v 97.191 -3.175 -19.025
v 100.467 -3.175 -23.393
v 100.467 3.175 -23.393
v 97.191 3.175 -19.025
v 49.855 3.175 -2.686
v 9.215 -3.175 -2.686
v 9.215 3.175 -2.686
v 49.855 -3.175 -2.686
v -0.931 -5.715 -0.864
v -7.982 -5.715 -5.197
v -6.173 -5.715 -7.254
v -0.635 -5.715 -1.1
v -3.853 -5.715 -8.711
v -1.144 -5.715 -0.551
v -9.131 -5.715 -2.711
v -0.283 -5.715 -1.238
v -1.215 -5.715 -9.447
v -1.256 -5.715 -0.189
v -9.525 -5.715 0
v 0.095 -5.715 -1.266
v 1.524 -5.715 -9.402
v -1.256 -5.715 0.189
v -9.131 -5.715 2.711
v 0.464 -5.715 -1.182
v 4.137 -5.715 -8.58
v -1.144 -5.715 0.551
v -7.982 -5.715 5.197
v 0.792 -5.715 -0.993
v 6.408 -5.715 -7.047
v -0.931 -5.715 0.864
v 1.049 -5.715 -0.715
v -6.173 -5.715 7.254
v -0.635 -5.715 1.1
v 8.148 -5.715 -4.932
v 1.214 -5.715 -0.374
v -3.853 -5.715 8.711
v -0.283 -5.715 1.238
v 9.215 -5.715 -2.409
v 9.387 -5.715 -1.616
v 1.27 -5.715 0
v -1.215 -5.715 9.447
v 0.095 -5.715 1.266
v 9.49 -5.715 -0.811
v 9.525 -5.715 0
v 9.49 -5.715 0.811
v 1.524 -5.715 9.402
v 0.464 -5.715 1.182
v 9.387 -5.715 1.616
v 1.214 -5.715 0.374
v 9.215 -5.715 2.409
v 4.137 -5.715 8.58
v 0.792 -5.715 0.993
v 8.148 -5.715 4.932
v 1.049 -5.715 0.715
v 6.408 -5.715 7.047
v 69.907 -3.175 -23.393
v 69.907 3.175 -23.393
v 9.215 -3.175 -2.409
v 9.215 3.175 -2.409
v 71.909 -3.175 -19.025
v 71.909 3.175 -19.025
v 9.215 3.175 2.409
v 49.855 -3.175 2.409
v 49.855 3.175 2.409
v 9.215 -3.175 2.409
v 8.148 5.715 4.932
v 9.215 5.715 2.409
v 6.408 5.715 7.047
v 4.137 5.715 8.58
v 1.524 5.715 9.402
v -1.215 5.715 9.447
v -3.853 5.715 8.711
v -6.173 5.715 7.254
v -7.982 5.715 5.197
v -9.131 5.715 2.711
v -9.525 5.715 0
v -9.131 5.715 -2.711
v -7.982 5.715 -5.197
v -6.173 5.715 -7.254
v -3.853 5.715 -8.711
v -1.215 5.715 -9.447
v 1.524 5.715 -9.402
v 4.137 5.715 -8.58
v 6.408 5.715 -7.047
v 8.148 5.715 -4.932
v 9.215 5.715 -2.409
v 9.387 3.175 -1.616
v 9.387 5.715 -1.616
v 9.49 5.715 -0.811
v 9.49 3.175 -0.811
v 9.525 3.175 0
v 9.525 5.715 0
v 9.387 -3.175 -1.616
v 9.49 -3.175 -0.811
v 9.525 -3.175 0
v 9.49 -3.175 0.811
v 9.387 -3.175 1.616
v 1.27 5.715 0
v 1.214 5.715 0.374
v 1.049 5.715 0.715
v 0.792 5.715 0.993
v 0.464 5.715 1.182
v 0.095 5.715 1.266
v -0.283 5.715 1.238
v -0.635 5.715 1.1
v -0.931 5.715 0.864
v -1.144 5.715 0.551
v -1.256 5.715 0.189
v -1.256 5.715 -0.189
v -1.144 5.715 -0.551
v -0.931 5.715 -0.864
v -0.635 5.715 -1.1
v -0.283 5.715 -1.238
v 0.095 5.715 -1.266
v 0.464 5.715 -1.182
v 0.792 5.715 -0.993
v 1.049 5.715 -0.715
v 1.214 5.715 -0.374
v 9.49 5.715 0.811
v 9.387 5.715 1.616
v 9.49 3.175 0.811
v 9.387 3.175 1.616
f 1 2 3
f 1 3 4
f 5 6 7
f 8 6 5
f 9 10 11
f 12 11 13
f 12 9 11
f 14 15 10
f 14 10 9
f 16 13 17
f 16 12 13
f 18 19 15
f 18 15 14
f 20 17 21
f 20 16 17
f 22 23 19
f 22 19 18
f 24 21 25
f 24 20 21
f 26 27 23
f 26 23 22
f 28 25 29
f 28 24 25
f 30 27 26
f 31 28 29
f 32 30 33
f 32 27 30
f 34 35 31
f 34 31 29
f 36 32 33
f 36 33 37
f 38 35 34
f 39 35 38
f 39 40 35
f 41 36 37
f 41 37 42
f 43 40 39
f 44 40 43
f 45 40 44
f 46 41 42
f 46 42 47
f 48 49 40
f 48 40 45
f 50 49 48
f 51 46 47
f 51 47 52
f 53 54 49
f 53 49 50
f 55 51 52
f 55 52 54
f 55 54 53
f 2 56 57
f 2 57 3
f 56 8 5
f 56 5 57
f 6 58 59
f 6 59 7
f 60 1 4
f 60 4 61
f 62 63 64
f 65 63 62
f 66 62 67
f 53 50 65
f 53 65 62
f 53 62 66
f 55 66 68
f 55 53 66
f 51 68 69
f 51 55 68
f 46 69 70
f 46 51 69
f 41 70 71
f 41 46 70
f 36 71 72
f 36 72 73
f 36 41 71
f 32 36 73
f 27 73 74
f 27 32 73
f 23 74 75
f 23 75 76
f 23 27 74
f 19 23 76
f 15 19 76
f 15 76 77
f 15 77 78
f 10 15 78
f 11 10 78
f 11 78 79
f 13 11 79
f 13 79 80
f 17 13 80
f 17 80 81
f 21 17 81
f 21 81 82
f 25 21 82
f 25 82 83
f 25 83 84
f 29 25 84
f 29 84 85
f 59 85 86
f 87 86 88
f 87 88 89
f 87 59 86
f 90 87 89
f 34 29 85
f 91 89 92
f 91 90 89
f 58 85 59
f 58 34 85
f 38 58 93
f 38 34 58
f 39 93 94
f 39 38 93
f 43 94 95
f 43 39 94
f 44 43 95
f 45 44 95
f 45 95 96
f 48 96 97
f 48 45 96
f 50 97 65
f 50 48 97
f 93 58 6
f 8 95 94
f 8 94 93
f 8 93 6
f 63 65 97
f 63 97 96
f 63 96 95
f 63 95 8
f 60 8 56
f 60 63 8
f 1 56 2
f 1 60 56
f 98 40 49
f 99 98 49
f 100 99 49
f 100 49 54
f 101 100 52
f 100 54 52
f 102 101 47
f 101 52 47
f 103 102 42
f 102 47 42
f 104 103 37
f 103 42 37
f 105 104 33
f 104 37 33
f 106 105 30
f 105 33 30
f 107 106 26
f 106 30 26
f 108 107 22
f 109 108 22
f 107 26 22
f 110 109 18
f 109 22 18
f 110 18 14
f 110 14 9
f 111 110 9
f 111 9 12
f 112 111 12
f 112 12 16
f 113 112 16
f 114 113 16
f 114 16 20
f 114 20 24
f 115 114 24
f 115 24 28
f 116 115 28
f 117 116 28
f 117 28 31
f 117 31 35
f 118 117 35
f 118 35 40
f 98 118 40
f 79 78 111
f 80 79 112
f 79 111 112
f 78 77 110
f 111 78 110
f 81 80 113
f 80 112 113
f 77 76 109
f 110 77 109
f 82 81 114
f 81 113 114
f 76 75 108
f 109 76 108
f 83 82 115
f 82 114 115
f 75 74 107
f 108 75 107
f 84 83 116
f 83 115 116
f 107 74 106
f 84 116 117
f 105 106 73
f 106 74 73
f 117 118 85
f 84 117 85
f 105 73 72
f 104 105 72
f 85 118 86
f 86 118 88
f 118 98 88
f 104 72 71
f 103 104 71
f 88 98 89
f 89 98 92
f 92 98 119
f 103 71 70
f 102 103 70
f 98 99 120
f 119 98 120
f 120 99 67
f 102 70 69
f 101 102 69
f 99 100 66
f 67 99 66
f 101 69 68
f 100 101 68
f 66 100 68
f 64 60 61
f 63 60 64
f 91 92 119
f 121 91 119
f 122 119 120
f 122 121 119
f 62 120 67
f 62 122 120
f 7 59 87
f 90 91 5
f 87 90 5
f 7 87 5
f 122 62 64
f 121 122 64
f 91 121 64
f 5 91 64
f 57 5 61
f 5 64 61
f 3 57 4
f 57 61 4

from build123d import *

# Parameters (mm, degrees)
F1_DEPTH = 5.715
F2_DEPTH = 3.175
F3_R     = 1.27
F4_DEPTH = 25.4


with BuildPart() as f1:
    # F0 (on Front) → F1 (new body, symmetric)
    with BuildSketch(Plane.XZ):
        with BuildLine():
            ThreePointArc((9.215210569, -2.4094644982), (9.4472351953, -1.2146489884), (9.525, 0))
            ThreePointArc((9.525, 0), (9.4472351953, 1.2146489884), (9.215210569, 2.4094644982))
            Line((9.215210569, 2.4094644982), (9.215210569, -2.4094644982))
        make_face()
        with BuildLine():
            Line((9.215210569, -2.4094644982), (9.215210569, 2.4094644982))
            ThreePointArc((9.215210569, 2.4094644982), (-9.525, 0), (9.215210569, -2.4094644982))
        make_face()
    extrude(amount=F1_DEPTH, both=True)

    # F0 (on Front) → F2 (join, symmetric)
    with BuildSketch(Plane.XZ):
        with BuildLine():
            ThreePointArc((9.215210569, 2.4094644982), (9.4472351953, 1.2146489884), (9.525, 0))
            ThreePointArc((9.525, 0), (9.4472351953, -1.2146489884), (9.215210569, -2.4094644982))
            Line((9.215210569, -2.4094644982), (9.215210569, -2.6859357022))
            Line((9.215210569, -2.6859357022), (49.855210569, -2.6859357022))
            Line((49.855210569, -2.6859357022), (49.855210569, 2.4094644982))
            Line((49.855210569, 2.4094644982), (9.215210569, 2.4094644982))
        make_face()
        Polygon((71.9085857272, -19.0247967839), (49.855210569, 2.4094644982), (49.855210569, -2.6859357022), (69.9069363303, -23.3931405965), (100.4668754262, -23.3931405965), (97.190618515, -19.0247967839), align=None)
    extrude(amount=F2_DEPTH, both=True)

    # F3 (on face) → F4 (cut)
    with BuildSketch(Plane.XZ.offset(5.715)):
        Circle(F3_R)
    extrude(amount=-F4_DEPTH, mode=Mode.SUBTRACT)


solid = f1.part
